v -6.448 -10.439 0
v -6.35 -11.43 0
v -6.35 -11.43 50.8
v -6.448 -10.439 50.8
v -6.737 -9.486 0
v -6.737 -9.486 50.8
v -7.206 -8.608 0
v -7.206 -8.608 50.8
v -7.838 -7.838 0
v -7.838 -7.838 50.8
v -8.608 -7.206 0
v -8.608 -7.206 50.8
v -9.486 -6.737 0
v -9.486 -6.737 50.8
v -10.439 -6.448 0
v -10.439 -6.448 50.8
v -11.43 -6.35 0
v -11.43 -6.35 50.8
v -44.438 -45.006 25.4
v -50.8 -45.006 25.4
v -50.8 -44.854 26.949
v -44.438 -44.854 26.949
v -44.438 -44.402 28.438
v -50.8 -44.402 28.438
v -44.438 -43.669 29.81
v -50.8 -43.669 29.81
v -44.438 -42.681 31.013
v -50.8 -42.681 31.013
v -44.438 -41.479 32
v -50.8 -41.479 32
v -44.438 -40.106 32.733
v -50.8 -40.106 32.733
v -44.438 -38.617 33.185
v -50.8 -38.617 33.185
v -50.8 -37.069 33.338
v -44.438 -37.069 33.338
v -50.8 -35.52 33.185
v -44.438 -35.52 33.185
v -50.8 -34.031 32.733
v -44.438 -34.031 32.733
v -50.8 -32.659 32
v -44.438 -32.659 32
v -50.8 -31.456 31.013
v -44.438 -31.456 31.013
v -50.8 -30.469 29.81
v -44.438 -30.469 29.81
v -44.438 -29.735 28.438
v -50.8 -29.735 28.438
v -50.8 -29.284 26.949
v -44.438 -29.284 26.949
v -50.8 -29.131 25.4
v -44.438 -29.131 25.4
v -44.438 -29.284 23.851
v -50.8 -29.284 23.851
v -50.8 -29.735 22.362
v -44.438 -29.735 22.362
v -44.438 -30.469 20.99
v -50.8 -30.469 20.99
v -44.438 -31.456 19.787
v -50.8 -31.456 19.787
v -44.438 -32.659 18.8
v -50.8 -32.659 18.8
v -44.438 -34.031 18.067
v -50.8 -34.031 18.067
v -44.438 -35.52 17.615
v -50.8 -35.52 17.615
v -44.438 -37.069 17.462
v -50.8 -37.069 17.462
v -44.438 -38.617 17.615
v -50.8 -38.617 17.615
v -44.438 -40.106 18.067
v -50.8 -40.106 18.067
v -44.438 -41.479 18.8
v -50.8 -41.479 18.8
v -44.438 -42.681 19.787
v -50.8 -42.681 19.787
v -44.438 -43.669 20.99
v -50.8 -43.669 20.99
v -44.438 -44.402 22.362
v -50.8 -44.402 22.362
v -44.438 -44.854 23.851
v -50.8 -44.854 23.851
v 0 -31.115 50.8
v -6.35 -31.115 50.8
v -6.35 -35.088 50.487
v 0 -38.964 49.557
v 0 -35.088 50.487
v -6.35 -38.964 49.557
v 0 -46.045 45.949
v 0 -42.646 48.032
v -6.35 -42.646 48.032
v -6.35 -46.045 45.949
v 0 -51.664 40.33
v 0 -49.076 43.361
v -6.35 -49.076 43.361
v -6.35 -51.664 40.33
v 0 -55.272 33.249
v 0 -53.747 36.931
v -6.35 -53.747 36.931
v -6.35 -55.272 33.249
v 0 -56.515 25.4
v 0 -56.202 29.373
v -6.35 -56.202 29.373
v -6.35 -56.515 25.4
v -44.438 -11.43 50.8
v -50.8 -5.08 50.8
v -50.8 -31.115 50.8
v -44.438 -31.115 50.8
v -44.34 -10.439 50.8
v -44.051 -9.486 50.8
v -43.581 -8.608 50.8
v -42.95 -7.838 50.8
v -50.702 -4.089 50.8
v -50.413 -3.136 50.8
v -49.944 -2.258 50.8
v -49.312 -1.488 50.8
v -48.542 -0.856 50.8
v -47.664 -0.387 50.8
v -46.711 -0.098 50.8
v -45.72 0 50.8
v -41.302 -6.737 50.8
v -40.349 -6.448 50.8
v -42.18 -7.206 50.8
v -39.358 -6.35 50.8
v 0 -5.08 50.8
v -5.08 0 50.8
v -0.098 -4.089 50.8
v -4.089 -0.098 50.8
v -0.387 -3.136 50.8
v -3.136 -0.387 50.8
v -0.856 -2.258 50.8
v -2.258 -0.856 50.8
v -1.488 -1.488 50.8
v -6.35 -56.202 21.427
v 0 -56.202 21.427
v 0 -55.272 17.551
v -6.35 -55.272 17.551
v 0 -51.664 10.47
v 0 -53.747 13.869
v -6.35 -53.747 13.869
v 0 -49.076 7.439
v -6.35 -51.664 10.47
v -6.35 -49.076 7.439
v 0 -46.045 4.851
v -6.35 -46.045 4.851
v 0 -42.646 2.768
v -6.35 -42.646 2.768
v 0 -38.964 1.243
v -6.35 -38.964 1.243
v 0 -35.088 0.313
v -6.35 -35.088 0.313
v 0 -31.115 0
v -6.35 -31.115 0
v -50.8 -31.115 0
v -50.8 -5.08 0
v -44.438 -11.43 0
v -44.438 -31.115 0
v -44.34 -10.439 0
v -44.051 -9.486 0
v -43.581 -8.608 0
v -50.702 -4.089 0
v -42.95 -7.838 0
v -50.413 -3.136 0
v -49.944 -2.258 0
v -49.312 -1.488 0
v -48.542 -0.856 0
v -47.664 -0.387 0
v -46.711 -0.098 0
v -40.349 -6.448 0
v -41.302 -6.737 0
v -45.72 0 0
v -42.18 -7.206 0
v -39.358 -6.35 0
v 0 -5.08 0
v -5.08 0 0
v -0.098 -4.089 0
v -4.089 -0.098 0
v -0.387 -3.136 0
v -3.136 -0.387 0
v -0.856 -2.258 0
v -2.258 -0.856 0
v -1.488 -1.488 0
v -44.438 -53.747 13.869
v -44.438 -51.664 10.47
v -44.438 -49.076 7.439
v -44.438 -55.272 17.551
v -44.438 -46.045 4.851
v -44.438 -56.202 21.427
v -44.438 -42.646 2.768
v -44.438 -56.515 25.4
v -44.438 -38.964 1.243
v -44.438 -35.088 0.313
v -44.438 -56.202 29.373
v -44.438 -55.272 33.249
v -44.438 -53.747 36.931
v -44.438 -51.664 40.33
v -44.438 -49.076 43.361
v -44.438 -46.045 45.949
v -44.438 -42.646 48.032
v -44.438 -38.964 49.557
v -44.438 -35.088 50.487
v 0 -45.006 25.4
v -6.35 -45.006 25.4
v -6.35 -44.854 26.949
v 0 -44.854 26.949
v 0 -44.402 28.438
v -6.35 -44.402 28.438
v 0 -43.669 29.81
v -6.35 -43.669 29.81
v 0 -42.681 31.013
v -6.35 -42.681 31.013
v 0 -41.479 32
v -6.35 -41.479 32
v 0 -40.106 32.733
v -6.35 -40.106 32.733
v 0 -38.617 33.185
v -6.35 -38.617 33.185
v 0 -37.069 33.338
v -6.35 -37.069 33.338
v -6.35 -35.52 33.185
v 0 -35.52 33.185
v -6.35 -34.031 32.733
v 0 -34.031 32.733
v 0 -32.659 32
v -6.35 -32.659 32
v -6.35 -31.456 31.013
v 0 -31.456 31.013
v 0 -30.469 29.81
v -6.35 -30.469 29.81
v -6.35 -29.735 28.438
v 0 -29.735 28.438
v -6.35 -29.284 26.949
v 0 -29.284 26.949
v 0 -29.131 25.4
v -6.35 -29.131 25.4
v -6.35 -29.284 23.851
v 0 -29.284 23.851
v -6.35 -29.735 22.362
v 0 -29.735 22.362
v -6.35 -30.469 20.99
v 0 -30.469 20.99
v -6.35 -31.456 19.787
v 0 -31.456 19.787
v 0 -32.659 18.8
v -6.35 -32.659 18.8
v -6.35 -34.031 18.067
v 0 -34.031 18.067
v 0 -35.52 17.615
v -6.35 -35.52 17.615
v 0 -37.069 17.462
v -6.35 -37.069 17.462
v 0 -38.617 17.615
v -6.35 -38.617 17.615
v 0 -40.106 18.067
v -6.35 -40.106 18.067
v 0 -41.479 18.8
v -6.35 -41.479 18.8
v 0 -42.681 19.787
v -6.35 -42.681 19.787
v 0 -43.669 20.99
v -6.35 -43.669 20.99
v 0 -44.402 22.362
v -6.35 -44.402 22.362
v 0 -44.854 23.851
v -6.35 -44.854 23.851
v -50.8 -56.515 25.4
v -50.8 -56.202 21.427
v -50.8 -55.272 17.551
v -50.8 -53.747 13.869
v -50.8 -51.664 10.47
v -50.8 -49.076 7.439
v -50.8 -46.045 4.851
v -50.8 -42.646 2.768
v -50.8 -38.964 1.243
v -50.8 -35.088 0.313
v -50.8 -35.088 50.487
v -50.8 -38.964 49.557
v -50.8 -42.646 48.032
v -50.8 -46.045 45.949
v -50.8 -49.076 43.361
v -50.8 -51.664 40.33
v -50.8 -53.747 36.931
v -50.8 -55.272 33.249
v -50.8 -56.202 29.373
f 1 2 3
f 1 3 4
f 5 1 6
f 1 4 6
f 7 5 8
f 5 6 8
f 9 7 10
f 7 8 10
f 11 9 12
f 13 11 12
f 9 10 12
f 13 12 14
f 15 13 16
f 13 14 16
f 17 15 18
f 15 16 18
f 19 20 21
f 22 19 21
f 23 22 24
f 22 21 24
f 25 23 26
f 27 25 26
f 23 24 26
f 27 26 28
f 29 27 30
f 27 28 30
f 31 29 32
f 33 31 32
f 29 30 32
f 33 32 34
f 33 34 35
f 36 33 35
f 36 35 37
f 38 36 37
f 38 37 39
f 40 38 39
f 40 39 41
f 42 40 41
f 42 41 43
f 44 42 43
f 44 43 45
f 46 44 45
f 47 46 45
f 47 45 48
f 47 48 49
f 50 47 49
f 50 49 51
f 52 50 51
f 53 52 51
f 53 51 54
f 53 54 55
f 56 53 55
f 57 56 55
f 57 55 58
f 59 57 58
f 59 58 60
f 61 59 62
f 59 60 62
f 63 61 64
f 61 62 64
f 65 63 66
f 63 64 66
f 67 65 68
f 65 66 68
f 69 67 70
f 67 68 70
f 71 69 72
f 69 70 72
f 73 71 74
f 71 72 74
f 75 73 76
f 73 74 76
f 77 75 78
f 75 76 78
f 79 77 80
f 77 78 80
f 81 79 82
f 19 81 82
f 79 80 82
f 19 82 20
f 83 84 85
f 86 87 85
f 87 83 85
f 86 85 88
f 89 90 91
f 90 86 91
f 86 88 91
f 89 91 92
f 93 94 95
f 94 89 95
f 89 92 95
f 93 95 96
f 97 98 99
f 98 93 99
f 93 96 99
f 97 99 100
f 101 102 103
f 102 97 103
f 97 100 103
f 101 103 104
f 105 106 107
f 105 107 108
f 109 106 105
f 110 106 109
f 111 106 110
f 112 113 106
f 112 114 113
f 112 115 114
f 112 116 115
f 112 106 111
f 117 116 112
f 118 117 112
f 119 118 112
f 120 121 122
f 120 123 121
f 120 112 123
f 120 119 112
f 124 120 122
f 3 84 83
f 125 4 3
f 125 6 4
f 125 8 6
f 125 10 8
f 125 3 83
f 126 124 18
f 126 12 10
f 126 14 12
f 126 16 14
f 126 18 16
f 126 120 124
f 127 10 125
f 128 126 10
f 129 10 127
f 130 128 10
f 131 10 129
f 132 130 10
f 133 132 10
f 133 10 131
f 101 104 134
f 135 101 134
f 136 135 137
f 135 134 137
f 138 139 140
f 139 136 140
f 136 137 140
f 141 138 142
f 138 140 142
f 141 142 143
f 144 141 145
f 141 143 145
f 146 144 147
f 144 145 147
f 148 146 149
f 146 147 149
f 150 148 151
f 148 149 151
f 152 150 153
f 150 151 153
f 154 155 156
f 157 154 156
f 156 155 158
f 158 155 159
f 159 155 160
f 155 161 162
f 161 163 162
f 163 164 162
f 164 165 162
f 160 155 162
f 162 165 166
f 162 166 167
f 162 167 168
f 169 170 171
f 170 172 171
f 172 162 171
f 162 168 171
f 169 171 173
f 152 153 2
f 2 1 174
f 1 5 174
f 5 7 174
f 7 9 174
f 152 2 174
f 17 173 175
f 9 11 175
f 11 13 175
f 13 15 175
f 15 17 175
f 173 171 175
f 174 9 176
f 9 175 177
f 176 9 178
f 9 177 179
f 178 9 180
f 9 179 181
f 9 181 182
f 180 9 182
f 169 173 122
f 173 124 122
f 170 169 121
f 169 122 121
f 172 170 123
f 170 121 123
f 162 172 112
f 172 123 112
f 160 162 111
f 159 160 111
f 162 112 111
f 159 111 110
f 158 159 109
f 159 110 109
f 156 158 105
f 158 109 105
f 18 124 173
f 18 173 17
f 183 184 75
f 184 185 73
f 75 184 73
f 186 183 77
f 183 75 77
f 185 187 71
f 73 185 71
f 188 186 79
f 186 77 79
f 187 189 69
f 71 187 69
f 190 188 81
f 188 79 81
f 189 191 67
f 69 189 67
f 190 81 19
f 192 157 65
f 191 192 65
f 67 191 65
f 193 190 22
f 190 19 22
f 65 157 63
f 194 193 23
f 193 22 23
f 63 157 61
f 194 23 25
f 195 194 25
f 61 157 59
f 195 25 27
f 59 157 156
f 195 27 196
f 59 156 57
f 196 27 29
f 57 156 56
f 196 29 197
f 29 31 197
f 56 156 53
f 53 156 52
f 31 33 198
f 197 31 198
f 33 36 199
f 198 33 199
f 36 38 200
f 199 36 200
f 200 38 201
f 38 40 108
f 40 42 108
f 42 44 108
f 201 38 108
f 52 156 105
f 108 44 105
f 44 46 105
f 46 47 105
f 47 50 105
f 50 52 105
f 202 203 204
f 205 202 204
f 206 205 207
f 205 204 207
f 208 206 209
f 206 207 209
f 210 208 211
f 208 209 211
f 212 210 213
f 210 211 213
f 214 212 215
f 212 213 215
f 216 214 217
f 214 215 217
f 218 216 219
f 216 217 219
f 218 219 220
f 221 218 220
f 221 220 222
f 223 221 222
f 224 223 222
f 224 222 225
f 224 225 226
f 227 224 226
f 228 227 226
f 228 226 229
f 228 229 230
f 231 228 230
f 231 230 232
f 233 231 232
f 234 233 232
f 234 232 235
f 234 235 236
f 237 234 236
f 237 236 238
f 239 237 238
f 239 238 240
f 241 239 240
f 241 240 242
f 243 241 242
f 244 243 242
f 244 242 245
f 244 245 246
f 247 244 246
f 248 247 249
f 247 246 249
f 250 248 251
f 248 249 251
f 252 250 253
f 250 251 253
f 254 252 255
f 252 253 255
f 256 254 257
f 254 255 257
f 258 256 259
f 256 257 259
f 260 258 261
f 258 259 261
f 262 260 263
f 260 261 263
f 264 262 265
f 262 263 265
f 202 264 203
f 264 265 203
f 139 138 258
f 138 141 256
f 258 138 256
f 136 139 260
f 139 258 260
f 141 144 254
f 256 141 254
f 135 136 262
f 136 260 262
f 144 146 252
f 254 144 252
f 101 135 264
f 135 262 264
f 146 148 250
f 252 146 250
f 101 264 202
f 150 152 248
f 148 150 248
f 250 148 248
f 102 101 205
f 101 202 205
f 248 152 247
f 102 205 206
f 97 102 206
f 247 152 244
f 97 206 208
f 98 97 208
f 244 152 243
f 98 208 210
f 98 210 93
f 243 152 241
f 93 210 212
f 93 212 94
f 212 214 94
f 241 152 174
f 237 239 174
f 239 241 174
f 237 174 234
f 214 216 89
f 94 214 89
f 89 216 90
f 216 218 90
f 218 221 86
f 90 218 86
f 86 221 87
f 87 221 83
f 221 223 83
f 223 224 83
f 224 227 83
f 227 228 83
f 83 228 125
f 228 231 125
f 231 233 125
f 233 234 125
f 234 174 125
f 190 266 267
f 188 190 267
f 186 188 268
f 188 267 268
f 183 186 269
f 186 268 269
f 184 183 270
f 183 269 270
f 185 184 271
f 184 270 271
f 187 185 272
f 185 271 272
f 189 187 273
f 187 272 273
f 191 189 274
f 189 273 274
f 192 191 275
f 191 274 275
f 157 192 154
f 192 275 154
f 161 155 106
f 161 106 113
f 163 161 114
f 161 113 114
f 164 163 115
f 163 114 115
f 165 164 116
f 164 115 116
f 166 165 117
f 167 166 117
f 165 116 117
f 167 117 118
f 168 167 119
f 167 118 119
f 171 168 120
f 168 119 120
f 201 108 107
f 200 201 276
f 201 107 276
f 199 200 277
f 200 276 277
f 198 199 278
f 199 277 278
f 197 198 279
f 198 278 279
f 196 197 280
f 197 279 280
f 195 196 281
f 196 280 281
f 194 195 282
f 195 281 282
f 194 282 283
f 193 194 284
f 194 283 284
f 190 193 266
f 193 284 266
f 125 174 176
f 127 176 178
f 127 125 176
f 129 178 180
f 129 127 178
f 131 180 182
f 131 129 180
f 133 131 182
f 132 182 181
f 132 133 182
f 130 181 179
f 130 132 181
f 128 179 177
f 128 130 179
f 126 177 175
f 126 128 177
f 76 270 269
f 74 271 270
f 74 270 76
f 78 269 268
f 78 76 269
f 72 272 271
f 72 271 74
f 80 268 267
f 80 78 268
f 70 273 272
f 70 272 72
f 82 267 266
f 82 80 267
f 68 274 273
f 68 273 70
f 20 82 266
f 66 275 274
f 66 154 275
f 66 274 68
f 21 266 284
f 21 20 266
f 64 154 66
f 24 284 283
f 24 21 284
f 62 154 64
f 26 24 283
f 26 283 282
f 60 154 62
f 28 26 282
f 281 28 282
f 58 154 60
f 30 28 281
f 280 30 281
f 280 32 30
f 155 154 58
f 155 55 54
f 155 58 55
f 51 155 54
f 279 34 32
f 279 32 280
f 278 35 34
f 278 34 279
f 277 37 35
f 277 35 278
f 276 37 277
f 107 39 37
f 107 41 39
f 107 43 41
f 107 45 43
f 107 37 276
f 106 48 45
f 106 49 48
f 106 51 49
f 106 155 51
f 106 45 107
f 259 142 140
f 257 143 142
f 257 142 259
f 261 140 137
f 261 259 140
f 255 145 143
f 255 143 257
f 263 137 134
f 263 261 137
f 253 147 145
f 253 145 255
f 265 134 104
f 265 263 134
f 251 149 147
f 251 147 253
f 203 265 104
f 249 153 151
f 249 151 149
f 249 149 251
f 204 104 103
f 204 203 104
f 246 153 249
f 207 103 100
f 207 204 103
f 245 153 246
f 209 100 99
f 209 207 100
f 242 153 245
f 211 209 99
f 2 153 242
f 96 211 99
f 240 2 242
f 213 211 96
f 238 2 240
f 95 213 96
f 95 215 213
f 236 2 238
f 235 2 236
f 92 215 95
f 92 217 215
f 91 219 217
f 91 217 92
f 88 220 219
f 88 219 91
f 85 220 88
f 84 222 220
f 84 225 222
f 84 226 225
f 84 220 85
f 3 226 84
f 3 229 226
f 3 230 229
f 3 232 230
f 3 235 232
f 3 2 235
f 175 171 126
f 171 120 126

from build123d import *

# Parameters (mm, degrees)
F0_W     = 50.8
F0_H     = 50.8
F1_DEPTH = 6.35
F2_W     = 6.3624648929
F2_H     = 50.8
F2_W_2   = 6.35
F3_DEPTH = 44.45
F4_R     = 5.08
F5_DEPTH = 6.35
F7_DEPTH = 148.336
F8_R     = 7.9375
F9_DEPTH = 94.742


with BuildPart() as f1:
    # F0 (on Front) → F1 (new body)
    with BuildSketch(Plane.XZ):
        with Locations((-25.4, 25.4)):
            Rectangle(F0_W, F0_H)
    extrude(amount=F1_DEPTH)

    # F2 (on face) → F3 (join)
    with BuildSketch(Plane.XZ.offset(6.35)):
        with Locations((-47.6187675536, 25.4)):
            Rectangle(F2_W, F2_H)
        with Locations((-3.175, 25.4)):
            Rectangle(F2_W_2, F2_H)
    extrude(amount=F3_DEPTH)

    # F4
    f4_edges = [f1.edges().sort_by_distance(p)[0] for p in [
        (-6.35, -6.35, 25.4),
        (-50.8, 0, 25.4),
        (-44.437535, -6.35, 25.4),
        (0, 0, 25.4),
    ]]
    fillet(f4_edges, radius=F4_R)

    # F5 (add): faces of the model
    f5_faces = [f1.faces().sort_by_distance(p)[0] for p in [
        (-47.6187675536, -50.8, 25.4),
        (-3.175, -50.8, 25.4),
        (-47.6187675536, -50.8, 25.4),
        (-3.175, -50.8, 25.4),
    ]]
    extrude(f5_faces, amount=F5_DEPTH)

    # F6 (on face) → F7 (cut)
    with BuildSketch(Plane(origin=(-50.8, 0, 0), x_dir=(0, -1, 0), z_dir=(-1, 0, 0))):
        with BuildLine():
            ThreePointArc((31.115, 50.8), (49.0755122421, 43.3605122421), (56.515, 25.4))
            ThreePointArc((56.515, 25.4), (49.0755122421, 7.4394877579), (31.115, 0))
            Line((31.115, 0), (57.15, 0))
            Line((57.15, 0), (57.15, 50.8))
            Line((57.15, 50.8), (31.115, 50.8))
        make_face()
    extrude(amount=-F7_DEPTH, mode=Mode.SUBTRACT)

    # F8 (on face) → F9 (cut)
    with BuildSketch(Plane(origin=(-50.8, 0, 0), x_dir=(0, -1, 0), z_dir=(-1, 0, 0))):
        with Locations((37.0687320828, 25.4)):
            Circle(F8_R)
    extrude(amount=-F9_DEPTH, mode=Mode.SUBTRACT)


solid = f1.part
